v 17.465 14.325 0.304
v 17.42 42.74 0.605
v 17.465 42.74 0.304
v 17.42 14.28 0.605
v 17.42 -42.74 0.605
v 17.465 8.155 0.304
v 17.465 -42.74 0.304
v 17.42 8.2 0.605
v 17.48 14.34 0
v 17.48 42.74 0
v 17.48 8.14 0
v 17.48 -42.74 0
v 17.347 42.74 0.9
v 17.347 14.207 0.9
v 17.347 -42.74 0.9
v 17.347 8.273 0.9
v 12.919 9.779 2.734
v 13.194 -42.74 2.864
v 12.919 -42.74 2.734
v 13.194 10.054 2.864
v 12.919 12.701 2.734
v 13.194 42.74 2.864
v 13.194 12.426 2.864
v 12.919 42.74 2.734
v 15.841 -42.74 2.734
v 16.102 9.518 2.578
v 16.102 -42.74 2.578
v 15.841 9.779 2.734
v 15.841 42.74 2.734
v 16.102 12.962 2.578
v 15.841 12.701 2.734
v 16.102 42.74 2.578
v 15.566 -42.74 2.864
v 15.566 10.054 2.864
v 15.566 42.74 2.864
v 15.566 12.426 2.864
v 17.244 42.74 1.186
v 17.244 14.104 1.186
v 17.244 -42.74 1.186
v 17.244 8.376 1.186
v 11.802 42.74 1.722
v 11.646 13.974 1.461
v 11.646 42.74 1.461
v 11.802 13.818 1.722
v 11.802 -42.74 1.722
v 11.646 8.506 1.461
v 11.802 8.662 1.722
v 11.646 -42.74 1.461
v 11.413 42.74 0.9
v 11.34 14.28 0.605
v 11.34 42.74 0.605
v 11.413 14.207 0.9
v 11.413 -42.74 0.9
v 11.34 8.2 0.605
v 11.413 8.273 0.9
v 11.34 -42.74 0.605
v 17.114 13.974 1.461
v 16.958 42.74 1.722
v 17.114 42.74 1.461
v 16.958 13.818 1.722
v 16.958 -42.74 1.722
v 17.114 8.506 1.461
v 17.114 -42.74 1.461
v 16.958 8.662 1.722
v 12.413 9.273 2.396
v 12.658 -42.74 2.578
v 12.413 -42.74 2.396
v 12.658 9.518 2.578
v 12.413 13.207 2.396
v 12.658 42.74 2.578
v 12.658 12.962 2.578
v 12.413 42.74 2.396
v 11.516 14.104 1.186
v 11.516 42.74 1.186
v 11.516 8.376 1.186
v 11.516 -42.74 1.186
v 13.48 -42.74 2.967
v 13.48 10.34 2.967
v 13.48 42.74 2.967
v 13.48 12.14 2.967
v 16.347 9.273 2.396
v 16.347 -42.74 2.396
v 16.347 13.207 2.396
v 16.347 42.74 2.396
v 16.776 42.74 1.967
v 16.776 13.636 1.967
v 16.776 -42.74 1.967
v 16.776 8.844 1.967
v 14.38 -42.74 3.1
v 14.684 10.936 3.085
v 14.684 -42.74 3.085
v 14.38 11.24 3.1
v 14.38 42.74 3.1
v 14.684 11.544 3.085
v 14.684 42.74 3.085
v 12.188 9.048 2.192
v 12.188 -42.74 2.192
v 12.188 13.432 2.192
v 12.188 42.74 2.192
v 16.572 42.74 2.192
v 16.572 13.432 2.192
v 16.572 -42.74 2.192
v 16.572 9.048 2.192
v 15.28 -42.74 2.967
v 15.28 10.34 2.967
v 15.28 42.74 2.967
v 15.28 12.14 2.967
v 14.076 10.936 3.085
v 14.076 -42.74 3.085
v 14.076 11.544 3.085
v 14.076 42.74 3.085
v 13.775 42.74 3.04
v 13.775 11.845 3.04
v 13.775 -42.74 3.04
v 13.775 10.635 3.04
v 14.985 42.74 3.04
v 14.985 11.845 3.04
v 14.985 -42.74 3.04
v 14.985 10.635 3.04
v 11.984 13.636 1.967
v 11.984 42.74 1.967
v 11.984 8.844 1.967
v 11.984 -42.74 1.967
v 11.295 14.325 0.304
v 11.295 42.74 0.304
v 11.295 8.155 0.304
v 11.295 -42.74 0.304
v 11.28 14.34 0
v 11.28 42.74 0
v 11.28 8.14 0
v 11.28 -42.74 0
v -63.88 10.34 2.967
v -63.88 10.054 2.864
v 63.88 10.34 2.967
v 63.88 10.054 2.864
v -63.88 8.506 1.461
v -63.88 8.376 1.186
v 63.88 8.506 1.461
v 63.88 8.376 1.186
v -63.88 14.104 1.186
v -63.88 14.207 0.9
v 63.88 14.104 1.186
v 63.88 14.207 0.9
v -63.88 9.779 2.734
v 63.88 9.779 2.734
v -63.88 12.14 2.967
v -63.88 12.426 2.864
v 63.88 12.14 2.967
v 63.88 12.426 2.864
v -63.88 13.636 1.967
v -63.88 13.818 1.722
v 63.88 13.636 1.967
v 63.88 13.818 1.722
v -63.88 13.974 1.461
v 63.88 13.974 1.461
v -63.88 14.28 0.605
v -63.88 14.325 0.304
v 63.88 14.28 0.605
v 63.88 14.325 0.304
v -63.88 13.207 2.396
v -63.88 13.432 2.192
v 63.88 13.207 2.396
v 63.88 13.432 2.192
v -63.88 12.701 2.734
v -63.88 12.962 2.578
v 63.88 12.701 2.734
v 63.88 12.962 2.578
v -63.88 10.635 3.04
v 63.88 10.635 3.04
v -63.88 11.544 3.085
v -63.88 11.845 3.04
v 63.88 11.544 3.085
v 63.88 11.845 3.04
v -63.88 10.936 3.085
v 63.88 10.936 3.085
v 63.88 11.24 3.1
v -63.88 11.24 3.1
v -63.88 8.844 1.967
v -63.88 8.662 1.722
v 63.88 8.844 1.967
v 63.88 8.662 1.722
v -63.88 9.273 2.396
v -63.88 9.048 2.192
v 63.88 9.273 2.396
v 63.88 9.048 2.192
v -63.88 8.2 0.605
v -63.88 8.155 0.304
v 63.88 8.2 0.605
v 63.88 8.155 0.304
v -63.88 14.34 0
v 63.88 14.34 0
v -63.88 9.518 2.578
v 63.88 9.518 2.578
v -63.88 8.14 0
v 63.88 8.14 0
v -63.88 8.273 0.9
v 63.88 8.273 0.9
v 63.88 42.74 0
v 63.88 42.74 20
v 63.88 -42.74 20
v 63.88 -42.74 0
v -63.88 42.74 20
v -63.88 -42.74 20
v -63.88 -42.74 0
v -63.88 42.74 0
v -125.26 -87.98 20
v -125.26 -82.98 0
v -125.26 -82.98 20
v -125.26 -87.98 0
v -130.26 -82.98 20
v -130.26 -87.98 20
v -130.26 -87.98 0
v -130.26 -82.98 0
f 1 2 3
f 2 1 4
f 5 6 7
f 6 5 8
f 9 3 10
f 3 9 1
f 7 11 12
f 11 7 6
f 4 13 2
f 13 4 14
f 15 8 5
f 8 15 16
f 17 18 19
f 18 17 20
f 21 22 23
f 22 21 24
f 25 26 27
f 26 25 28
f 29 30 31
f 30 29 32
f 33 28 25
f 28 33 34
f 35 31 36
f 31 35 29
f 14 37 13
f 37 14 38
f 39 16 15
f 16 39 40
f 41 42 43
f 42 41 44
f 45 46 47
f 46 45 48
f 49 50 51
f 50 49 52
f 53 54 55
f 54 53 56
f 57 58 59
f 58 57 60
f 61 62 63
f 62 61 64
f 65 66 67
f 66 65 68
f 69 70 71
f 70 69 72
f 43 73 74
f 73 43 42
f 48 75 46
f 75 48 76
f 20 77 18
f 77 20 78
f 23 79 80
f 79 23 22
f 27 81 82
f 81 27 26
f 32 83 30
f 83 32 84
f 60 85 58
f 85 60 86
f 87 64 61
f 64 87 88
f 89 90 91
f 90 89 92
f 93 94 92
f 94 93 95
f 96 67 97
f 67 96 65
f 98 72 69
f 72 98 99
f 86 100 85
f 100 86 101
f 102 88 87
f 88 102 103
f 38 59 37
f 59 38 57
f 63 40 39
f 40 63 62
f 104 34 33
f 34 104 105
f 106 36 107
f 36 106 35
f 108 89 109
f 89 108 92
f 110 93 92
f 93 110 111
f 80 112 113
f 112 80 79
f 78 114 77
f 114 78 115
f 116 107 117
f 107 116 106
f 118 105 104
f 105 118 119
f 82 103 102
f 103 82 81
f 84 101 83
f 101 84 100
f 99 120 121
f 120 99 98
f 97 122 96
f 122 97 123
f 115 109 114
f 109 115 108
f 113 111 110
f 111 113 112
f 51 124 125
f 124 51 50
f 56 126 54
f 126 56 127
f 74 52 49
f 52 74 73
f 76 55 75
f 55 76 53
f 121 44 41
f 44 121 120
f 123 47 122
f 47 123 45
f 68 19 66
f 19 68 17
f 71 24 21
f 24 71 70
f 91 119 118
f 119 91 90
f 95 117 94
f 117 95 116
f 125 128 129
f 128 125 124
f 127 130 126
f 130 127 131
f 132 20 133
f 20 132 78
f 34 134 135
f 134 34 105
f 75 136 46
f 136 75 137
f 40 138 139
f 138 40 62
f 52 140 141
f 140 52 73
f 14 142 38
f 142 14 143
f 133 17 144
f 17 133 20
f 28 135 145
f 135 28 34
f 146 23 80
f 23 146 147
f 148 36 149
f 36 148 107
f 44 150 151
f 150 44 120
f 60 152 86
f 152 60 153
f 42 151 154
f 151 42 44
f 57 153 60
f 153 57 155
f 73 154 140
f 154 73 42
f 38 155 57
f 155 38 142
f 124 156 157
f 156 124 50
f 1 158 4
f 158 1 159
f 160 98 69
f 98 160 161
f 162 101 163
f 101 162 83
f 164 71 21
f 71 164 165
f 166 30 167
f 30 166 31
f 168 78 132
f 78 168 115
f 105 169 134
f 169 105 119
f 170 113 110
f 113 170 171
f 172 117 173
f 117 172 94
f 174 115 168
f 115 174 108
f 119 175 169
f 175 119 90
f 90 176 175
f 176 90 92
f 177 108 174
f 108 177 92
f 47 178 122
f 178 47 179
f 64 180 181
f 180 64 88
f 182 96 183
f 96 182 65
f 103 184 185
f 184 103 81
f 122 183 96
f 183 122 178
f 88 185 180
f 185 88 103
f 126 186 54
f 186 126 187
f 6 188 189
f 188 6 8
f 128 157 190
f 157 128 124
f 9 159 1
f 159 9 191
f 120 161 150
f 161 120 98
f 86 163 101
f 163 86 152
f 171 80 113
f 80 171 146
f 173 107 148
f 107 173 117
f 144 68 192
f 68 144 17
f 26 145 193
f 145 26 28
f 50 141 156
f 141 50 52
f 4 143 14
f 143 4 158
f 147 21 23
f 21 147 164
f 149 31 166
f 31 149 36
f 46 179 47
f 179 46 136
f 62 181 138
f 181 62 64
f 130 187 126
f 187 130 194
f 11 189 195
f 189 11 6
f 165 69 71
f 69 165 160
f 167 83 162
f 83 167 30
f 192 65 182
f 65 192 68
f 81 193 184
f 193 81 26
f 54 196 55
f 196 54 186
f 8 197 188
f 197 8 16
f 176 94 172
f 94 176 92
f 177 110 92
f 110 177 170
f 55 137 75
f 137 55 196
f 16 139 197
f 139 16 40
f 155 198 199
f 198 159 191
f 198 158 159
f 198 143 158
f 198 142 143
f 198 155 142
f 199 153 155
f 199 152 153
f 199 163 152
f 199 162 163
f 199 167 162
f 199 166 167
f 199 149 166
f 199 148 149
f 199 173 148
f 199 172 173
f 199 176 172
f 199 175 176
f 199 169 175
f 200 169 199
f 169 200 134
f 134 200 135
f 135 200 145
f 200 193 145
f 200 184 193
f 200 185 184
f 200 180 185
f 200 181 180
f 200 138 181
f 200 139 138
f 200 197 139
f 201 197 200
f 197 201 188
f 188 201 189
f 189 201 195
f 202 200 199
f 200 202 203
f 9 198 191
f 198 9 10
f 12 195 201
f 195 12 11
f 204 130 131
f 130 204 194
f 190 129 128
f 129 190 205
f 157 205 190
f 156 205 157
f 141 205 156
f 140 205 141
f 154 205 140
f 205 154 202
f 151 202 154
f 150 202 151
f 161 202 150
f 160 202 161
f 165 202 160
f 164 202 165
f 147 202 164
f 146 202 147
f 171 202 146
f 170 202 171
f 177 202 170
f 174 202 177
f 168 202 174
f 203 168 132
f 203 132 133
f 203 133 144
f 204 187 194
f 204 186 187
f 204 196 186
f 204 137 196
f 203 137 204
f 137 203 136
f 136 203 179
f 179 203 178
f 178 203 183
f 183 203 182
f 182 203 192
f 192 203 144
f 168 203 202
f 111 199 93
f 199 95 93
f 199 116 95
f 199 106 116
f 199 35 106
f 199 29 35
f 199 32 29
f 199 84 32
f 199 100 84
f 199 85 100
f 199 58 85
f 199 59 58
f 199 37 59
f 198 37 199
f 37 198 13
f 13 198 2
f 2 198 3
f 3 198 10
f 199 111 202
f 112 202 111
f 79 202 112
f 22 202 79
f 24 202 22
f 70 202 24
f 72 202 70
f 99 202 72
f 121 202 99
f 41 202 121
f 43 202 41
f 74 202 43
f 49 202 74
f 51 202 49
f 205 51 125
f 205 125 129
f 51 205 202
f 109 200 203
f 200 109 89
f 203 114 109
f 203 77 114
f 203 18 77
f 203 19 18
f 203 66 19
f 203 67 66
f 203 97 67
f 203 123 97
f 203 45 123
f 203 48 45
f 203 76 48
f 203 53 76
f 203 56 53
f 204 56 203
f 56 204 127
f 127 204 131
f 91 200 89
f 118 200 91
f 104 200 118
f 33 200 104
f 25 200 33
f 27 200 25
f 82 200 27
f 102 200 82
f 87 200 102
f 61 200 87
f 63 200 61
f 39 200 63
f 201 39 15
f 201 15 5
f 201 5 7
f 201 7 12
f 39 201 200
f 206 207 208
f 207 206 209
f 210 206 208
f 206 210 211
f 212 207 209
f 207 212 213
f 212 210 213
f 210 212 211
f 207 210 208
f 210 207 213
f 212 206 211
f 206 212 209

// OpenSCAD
// Built by bench/smallmodels/features/compiler.py from a list of features.
$fn = 64;
difference() {
  union() {
    translate([0, 0, 0]) translate([-63.88, -42.74, 0]) cube([127.76, 85.48, 20]);
  }
  union() {
    translate([14.38, 11.24, 0]) rotate([0, 0, 0]) rotate([90, 0, 0]) cylinder(d = 6.2, h = 1080, center = true);
    translate([14.38, 11.24, 0]) rotate([0, 0, 0]) rotate([0, 90, 0]) cylinder(d = 6.2, h = 1080, center = true);
  }
}
union() {
    translate([-127.76, -85.48, 0]) translate([-2.5, -2.5, 0]) cube([5, 5, 20]);
  }
